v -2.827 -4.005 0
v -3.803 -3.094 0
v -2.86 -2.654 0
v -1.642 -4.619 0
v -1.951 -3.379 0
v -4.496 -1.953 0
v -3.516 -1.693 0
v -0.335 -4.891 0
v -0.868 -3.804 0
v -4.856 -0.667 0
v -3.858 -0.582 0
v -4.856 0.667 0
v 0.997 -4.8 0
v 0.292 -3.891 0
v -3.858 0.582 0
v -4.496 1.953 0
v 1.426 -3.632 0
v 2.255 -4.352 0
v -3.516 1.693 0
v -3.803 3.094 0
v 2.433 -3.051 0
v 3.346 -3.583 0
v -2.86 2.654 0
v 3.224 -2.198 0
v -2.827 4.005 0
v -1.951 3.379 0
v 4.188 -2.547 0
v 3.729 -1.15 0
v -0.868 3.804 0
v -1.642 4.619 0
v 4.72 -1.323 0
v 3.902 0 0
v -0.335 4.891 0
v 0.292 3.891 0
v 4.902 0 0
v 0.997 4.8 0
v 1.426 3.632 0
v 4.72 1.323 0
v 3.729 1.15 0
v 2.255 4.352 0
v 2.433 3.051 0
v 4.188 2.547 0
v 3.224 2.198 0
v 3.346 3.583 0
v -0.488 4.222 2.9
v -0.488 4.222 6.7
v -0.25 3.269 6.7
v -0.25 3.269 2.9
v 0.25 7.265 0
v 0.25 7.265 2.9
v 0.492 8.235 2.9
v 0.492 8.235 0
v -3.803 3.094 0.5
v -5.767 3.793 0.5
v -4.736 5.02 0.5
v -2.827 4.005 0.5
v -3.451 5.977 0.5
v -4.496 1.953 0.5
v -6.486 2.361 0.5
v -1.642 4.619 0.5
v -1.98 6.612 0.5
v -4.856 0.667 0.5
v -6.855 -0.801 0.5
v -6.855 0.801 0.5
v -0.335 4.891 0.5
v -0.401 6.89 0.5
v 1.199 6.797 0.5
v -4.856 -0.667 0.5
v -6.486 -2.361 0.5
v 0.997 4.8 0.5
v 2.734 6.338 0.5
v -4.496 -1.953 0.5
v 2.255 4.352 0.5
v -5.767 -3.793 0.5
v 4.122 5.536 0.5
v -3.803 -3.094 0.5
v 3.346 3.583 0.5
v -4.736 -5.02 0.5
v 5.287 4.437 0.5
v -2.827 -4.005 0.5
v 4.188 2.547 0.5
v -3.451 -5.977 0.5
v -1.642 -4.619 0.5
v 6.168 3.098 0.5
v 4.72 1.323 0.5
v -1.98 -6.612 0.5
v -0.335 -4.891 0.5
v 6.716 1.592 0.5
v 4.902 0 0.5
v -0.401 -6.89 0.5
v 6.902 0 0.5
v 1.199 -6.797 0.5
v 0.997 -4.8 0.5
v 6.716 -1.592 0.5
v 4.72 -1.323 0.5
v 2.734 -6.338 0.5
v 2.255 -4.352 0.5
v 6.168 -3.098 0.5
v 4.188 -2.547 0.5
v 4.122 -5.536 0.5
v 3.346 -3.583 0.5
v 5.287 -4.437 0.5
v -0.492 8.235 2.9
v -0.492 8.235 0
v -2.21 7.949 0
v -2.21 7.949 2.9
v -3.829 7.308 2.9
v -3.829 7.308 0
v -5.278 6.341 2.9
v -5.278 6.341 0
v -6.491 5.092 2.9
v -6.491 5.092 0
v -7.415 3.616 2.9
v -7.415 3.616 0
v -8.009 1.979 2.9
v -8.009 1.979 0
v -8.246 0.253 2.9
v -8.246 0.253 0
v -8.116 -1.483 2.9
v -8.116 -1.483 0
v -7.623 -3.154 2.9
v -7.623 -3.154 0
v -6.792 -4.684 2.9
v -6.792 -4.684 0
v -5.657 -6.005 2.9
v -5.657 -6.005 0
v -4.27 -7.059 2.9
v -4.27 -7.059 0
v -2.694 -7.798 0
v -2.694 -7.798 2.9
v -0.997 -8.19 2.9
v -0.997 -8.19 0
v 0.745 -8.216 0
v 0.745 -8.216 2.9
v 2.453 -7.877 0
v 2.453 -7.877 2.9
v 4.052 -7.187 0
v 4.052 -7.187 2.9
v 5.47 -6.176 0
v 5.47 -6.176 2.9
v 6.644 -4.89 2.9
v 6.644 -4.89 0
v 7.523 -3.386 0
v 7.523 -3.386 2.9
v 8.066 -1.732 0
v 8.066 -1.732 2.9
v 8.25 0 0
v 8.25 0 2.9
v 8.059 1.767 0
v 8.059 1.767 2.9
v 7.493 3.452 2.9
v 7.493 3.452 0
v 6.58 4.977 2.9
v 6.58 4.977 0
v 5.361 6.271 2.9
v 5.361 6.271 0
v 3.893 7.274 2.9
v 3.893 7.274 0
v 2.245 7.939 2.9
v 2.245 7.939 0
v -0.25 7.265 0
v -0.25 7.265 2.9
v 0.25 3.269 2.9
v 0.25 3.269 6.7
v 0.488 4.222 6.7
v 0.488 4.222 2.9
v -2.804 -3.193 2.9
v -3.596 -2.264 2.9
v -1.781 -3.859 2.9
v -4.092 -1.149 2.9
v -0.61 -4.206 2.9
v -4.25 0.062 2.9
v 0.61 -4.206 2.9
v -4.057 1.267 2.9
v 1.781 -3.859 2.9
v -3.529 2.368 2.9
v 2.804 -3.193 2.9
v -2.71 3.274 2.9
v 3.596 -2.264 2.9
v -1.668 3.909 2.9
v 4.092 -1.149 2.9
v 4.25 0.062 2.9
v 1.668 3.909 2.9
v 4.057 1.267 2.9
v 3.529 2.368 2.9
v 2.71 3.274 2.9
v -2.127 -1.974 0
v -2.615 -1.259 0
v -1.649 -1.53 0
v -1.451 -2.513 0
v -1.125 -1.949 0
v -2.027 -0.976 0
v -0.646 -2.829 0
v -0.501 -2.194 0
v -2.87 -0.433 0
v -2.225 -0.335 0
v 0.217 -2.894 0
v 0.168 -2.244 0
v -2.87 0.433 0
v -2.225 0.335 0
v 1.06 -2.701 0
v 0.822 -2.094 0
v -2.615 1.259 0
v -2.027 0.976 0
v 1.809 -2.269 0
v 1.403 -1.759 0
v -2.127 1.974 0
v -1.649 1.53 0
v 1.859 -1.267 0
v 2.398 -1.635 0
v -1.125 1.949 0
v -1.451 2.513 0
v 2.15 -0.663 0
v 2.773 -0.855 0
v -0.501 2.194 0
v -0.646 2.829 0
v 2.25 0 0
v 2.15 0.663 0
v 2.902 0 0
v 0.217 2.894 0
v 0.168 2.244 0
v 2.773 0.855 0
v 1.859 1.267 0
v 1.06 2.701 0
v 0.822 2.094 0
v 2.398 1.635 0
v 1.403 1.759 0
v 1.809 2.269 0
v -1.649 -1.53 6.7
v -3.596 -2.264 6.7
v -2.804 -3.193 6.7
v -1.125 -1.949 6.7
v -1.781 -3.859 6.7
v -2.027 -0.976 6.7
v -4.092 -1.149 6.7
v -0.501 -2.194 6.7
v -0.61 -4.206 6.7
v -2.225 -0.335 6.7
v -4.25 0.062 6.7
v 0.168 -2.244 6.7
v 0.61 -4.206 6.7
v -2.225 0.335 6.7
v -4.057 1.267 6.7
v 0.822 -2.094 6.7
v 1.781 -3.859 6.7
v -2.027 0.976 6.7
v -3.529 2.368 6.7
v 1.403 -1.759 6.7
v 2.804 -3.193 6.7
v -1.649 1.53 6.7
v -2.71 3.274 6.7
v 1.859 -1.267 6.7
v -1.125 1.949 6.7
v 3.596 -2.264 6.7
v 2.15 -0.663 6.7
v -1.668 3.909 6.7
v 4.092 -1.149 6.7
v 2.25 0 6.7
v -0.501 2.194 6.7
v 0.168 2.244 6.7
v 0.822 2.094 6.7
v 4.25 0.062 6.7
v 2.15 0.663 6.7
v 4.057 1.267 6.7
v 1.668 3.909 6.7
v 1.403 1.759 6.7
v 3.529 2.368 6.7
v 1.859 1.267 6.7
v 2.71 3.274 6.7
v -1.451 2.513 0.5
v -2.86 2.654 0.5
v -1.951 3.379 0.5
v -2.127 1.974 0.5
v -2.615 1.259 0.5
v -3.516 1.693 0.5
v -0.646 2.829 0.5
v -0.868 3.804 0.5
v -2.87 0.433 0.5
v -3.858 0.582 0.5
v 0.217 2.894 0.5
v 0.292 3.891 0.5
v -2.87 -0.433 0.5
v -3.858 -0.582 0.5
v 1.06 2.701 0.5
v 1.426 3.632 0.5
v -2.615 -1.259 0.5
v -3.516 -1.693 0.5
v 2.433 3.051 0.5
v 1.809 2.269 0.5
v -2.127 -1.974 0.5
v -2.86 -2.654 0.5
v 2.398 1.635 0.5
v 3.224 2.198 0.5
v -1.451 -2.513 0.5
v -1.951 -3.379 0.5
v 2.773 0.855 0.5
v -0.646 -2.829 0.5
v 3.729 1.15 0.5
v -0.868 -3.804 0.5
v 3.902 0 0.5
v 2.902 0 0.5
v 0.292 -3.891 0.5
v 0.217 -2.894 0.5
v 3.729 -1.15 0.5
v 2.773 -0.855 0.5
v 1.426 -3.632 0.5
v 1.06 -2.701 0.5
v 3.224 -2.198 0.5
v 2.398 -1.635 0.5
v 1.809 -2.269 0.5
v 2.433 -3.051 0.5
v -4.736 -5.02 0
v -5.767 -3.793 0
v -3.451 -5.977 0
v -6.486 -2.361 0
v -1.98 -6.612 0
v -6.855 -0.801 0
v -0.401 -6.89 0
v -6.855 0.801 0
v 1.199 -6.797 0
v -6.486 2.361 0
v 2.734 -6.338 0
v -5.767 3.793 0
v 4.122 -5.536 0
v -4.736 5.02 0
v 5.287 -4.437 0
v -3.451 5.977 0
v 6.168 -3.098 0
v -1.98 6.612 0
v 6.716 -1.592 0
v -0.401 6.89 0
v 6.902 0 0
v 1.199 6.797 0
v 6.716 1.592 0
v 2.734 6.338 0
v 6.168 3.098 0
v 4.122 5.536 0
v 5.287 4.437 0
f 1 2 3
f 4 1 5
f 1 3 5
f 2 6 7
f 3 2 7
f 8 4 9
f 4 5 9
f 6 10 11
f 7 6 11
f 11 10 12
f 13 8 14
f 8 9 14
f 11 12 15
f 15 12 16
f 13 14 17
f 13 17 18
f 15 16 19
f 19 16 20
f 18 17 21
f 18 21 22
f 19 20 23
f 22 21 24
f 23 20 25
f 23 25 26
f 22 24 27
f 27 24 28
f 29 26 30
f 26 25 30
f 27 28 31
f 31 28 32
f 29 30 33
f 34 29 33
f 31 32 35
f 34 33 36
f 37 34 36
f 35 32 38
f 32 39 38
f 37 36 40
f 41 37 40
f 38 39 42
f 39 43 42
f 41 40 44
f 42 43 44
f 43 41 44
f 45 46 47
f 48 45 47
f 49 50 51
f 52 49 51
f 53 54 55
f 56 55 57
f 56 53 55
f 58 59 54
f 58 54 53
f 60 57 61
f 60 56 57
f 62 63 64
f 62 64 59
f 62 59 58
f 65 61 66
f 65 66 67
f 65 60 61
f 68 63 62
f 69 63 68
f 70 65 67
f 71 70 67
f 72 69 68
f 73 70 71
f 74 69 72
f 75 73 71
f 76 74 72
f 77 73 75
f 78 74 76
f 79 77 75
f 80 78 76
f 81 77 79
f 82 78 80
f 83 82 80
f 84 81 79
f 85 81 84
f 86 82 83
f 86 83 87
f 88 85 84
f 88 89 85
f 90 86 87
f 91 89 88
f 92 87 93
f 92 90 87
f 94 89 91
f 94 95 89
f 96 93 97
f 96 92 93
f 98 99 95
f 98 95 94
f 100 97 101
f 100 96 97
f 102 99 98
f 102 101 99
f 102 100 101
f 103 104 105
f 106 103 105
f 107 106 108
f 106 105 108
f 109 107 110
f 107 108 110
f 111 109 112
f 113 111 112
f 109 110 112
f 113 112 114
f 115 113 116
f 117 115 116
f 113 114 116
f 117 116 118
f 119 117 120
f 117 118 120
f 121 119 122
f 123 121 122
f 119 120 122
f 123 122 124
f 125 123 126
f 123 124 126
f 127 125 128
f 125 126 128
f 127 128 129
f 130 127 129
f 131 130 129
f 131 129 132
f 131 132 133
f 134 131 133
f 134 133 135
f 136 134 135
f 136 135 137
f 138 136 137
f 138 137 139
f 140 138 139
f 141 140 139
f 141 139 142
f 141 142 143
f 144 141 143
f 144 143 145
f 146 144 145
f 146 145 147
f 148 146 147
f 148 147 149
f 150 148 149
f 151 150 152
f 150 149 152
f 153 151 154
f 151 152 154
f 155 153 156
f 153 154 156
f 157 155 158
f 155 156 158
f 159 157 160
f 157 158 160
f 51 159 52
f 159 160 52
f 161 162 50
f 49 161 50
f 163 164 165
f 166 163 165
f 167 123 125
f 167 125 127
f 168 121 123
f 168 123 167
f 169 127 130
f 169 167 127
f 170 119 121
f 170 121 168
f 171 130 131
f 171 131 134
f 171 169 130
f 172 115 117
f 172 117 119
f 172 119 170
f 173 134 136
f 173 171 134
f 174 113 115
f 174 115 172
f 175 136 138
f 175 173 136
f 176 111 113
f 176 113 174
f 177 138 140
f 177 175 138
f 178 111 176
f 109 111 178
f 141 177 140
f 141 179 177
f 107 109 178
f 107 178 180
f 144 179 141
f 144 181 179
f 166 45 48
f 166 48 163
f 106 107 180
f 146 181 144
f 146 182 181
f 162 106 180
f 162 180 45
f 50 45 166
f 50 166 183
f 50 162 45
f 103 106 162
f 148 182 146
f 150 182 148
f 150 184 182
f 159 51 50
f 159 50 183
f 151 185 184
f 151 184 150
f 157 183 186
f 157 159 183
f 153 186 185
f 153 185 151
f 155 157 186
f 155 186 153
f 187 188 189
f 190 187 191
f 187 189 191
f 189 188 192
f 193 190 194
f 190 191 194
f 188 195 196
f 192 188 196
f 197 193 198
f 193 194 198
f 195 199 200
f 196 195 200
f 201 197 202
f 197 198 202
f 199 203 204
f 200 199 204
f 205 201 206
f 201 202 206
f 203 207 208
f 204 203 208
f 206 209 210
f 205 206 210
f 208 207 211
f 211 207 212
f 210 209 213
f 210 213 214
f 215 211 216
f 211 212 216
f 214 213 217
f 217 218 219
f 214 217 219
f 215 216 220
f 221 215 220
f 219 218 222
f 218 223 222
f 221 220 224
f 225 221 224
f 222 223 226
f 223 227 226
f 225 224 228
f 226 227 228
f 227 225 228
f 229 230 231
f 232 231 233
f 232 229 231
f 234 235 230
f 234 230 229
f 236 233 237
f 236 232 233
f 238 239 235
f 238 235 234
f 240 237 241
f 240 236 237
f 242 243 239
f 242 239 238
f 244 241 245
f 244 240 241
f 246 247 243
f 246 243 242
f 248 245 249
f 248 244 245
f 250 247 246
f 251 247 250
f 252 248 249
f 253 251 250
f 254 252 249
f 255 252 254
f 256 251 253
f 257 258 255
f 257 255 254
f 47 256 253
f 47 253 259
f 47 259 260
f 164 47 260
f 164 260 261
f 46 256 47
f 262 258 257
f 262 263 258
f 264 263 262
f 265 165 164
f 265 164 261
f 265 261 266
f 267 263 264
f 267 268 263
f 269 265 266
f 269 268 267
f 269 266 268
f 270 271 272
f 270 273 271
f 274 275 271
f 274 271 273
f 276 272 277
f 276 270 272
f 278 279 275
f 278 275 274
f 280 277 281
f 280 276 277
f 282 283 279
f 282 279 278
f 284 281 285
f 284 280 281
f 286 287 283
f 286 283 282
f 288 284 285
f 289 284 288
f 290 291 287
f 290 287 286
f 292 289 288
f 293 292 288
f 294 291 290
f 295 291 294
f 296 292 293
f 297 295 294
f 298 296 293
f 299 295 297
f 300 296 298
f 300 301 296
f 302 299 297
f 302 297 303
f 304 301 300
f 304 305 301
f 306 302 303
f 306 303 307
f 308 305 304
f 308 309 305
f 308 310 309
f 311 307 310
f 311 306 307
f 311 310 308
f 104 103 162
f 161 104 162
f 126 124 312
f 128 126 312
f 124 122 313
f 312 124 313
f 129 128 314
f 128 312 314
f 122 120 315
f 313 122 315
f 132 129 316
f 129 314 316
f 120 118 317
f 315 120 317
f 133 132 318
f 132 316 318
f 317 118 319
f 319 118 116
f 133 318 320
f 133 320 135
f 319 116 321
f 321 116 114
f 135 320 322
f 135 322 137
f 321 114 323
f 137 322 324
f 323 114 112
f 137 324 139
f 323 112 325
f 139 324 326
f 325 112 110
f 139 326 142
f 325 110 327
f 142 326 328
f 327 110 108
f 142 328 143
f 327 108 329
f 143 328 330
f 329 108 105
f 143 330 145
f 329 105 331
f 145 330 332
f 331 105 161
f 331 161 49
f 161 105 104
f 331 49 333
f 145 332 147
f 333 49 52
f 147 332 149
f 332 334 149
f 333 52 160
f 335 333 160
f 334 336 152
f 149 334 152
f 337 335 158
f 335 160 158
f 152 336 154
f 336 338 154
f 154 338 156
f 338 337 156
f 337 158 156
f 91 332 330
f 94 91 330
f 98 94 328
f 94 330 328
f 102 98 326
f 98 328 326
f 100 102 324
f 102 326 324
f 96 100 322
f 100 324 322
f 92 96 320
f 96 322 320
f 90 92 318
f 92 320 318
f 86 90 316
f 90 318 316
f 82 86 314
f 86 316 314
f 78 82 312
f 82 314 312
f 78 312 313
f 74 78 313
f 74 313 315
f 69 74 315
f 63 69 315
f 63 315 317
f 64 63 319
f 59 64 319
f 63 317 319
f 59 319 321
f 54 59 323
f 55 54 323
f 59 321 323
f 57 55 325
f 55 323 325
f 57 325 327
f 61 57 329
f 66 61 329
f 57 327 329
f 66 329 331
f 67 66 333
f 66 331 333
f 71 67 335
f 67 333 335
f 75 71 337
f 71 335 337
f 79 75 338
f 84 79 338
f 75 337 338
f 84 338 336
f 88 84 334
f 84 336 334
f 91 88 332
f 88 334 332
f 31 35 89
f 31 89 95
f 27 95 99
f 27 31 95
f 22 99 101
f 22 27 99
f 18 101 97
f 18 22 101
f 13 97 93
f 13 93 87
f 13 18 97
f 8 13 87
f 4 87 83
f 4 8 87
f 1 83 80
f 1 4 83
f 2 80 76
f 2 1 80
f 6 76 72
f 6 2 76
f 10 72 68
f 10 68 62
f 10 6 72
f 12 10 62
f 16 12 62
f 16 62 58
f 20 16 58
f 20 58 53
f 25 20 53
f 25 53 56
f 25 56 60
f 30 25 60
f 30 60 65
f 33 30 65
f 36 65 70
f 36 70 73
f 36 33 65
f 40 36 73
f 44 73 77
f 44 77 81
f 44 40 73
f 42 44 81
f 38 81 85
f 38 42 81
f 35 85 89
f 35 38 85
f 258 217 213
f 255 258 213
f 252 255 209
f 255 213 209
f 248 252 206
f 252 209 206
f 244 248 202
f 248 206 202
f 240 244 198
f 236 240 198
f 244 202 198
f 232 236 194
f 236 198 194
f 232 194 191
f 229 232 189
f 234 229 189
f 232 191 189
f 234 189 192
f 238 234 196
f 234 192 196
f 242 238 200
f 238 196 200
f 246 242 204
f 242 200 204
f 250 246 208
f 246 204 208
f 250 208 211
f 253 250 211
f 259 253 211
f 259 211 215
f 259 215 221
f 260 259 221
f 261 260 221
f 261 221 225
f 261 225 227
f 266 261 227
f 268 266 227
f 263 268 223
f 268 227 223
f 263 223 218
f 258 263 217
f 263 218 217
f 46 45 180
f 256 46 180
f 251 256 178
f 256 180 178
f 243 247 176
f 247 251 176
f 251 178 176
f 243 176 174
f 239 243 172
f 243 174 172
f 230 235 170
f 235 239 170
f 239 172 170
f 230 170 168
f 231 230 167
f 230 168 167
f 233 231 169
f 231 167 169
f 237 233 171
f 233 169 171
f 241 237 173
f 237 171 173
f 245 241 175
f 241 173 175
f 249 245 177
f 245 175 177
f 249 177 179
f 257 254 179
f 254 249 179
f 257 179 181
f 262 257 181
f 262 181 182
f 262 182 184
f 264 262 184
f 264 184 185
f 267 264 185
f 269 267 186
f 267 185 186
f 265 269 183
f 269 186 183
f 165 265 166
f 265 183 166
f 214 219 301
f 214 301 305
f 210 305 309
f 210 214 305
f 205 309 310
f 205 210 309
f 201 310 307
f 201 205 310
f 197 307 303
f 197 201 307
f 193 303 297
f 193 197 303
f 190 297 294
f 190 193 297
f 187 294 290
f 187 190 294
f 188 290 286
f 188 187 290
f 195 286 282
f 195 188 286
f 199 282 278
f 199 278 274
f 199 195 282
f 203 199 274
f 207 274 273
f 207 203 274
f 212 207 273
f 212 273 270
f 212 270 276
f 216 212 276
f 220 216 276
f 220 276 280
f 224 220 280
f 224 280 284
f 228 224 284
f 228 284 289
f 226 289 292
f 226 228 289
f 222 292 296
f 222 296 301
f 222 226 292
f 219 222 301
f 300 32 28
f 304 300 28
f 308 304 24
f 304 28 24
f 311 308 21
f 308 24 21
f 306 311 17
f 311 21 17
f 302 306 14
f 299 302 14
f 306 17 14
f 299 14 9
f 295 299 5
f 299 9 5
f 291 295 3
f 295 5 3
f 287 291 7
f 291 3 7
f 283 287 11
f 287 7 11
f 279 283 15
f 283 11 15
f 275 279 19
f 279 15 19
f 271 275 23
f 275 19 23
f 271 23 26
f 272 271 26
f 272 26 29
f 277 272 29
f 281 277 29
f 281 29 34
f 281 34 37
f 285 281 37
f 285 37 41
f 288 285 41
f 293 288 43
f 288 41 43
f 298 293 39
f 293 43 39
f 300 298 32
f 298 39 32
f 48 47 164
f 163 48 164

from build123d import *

# Parameters (mm, degrees)
F0_R      = 8.25
F1_DEPTH  = 2.9
F2_R      = 4.25
F3_DEPTH  = 3.8
F5_DEPTH  = 2.9
F7_DEPTH  = 3.8
F8_R      = 2.25
F9_DEPTH  = 6.7
F8_R_2    = 6.9020481578
F8_R_3    = 4.9020481578
F8_R_4    = 3.9020481578
F8_R_5    = 2.9020481578
F10_DEPTH = 0.5


with BuildPart() as f1:
    # F0 (on Top) → F1 (new body)
    with BuildSketch(Plane.XY):
        Circle(F0_R)
    extrude(amount=F1_DEPTH)

    # F2 (on face) → F3 (join)
    with BuildSketch(Plane.XY.offset(2.9)):
        Circle(F2_R)
    extrude(amount=F3_DEPTH)

    # F4 (on face) → F5 (cut)
    with BuildSketch(Plane.XY.offset(2.9)):
        with BuildLine():
            ThreePointArc((0.4919195185, 8.2353211952), (0, 8.25), (-0.4919195185, 8.2353211952))
            Line((-0.4919195185, 8.2353211952), (-0.25, 7.265035003))
            Line((-0.25, 7.265035003), (0.25, 7.265035003))
            Line((0.25, 7.265035003), (0.4919195185, 8.2353211952))
        make_face()
    extrude(amount=-F5_DEPTH, mode=Mode.SUBTRACT)

    # F6 (on face) → F7 (cut)
    with BuildSketch(Plane.XY.offset(6.7)):
        with BuildLine():
            ThreePointArc((0.4875978882, 4.221936558), (0, 4.25), (-0.4875978882, 4.221936558))
            Line((-0.4875978882, 4.221936558), (-0.25, 3.2689834782))
            Line((-0.25, 3.2689834782), (0.25, 3.2689834782))
            Line((0.25, 3.2689834782), (0.4875978882, 4.221936558))
        make_face()
    extrude(amount=-F7_DEPTH, mode=Mode.SUBTRACT)

    # F8 (on face) → F9 (cut)
    with BuildSketch(Plane(origin=(0, 0, 0), x_dir=(1, 0, 0), z_dir=(0, 0, -1))):
        Circle(F8_R)
    extrude(amount=-F9_DEPTH, mode=Mode.SUBTRACT)

    # F8 (on face) → F10 (cut)
    with BuildSketch(Plane(origin=(0, 0, 0), x_dir=(1, 0, 0), z_dir=(0, 0, -1))):
        Circle(F8_R_2)
        Circle(F8_R_3, mode=Mode.SUBTRACT)
        Circle(F8_R_4)
        Circle(F8_R_5, mode=Mode.SUBTRACT)
    extrude(amount=-F10_DEPTH, mode=Mode.SUBTRACT)


solid = f1.part
